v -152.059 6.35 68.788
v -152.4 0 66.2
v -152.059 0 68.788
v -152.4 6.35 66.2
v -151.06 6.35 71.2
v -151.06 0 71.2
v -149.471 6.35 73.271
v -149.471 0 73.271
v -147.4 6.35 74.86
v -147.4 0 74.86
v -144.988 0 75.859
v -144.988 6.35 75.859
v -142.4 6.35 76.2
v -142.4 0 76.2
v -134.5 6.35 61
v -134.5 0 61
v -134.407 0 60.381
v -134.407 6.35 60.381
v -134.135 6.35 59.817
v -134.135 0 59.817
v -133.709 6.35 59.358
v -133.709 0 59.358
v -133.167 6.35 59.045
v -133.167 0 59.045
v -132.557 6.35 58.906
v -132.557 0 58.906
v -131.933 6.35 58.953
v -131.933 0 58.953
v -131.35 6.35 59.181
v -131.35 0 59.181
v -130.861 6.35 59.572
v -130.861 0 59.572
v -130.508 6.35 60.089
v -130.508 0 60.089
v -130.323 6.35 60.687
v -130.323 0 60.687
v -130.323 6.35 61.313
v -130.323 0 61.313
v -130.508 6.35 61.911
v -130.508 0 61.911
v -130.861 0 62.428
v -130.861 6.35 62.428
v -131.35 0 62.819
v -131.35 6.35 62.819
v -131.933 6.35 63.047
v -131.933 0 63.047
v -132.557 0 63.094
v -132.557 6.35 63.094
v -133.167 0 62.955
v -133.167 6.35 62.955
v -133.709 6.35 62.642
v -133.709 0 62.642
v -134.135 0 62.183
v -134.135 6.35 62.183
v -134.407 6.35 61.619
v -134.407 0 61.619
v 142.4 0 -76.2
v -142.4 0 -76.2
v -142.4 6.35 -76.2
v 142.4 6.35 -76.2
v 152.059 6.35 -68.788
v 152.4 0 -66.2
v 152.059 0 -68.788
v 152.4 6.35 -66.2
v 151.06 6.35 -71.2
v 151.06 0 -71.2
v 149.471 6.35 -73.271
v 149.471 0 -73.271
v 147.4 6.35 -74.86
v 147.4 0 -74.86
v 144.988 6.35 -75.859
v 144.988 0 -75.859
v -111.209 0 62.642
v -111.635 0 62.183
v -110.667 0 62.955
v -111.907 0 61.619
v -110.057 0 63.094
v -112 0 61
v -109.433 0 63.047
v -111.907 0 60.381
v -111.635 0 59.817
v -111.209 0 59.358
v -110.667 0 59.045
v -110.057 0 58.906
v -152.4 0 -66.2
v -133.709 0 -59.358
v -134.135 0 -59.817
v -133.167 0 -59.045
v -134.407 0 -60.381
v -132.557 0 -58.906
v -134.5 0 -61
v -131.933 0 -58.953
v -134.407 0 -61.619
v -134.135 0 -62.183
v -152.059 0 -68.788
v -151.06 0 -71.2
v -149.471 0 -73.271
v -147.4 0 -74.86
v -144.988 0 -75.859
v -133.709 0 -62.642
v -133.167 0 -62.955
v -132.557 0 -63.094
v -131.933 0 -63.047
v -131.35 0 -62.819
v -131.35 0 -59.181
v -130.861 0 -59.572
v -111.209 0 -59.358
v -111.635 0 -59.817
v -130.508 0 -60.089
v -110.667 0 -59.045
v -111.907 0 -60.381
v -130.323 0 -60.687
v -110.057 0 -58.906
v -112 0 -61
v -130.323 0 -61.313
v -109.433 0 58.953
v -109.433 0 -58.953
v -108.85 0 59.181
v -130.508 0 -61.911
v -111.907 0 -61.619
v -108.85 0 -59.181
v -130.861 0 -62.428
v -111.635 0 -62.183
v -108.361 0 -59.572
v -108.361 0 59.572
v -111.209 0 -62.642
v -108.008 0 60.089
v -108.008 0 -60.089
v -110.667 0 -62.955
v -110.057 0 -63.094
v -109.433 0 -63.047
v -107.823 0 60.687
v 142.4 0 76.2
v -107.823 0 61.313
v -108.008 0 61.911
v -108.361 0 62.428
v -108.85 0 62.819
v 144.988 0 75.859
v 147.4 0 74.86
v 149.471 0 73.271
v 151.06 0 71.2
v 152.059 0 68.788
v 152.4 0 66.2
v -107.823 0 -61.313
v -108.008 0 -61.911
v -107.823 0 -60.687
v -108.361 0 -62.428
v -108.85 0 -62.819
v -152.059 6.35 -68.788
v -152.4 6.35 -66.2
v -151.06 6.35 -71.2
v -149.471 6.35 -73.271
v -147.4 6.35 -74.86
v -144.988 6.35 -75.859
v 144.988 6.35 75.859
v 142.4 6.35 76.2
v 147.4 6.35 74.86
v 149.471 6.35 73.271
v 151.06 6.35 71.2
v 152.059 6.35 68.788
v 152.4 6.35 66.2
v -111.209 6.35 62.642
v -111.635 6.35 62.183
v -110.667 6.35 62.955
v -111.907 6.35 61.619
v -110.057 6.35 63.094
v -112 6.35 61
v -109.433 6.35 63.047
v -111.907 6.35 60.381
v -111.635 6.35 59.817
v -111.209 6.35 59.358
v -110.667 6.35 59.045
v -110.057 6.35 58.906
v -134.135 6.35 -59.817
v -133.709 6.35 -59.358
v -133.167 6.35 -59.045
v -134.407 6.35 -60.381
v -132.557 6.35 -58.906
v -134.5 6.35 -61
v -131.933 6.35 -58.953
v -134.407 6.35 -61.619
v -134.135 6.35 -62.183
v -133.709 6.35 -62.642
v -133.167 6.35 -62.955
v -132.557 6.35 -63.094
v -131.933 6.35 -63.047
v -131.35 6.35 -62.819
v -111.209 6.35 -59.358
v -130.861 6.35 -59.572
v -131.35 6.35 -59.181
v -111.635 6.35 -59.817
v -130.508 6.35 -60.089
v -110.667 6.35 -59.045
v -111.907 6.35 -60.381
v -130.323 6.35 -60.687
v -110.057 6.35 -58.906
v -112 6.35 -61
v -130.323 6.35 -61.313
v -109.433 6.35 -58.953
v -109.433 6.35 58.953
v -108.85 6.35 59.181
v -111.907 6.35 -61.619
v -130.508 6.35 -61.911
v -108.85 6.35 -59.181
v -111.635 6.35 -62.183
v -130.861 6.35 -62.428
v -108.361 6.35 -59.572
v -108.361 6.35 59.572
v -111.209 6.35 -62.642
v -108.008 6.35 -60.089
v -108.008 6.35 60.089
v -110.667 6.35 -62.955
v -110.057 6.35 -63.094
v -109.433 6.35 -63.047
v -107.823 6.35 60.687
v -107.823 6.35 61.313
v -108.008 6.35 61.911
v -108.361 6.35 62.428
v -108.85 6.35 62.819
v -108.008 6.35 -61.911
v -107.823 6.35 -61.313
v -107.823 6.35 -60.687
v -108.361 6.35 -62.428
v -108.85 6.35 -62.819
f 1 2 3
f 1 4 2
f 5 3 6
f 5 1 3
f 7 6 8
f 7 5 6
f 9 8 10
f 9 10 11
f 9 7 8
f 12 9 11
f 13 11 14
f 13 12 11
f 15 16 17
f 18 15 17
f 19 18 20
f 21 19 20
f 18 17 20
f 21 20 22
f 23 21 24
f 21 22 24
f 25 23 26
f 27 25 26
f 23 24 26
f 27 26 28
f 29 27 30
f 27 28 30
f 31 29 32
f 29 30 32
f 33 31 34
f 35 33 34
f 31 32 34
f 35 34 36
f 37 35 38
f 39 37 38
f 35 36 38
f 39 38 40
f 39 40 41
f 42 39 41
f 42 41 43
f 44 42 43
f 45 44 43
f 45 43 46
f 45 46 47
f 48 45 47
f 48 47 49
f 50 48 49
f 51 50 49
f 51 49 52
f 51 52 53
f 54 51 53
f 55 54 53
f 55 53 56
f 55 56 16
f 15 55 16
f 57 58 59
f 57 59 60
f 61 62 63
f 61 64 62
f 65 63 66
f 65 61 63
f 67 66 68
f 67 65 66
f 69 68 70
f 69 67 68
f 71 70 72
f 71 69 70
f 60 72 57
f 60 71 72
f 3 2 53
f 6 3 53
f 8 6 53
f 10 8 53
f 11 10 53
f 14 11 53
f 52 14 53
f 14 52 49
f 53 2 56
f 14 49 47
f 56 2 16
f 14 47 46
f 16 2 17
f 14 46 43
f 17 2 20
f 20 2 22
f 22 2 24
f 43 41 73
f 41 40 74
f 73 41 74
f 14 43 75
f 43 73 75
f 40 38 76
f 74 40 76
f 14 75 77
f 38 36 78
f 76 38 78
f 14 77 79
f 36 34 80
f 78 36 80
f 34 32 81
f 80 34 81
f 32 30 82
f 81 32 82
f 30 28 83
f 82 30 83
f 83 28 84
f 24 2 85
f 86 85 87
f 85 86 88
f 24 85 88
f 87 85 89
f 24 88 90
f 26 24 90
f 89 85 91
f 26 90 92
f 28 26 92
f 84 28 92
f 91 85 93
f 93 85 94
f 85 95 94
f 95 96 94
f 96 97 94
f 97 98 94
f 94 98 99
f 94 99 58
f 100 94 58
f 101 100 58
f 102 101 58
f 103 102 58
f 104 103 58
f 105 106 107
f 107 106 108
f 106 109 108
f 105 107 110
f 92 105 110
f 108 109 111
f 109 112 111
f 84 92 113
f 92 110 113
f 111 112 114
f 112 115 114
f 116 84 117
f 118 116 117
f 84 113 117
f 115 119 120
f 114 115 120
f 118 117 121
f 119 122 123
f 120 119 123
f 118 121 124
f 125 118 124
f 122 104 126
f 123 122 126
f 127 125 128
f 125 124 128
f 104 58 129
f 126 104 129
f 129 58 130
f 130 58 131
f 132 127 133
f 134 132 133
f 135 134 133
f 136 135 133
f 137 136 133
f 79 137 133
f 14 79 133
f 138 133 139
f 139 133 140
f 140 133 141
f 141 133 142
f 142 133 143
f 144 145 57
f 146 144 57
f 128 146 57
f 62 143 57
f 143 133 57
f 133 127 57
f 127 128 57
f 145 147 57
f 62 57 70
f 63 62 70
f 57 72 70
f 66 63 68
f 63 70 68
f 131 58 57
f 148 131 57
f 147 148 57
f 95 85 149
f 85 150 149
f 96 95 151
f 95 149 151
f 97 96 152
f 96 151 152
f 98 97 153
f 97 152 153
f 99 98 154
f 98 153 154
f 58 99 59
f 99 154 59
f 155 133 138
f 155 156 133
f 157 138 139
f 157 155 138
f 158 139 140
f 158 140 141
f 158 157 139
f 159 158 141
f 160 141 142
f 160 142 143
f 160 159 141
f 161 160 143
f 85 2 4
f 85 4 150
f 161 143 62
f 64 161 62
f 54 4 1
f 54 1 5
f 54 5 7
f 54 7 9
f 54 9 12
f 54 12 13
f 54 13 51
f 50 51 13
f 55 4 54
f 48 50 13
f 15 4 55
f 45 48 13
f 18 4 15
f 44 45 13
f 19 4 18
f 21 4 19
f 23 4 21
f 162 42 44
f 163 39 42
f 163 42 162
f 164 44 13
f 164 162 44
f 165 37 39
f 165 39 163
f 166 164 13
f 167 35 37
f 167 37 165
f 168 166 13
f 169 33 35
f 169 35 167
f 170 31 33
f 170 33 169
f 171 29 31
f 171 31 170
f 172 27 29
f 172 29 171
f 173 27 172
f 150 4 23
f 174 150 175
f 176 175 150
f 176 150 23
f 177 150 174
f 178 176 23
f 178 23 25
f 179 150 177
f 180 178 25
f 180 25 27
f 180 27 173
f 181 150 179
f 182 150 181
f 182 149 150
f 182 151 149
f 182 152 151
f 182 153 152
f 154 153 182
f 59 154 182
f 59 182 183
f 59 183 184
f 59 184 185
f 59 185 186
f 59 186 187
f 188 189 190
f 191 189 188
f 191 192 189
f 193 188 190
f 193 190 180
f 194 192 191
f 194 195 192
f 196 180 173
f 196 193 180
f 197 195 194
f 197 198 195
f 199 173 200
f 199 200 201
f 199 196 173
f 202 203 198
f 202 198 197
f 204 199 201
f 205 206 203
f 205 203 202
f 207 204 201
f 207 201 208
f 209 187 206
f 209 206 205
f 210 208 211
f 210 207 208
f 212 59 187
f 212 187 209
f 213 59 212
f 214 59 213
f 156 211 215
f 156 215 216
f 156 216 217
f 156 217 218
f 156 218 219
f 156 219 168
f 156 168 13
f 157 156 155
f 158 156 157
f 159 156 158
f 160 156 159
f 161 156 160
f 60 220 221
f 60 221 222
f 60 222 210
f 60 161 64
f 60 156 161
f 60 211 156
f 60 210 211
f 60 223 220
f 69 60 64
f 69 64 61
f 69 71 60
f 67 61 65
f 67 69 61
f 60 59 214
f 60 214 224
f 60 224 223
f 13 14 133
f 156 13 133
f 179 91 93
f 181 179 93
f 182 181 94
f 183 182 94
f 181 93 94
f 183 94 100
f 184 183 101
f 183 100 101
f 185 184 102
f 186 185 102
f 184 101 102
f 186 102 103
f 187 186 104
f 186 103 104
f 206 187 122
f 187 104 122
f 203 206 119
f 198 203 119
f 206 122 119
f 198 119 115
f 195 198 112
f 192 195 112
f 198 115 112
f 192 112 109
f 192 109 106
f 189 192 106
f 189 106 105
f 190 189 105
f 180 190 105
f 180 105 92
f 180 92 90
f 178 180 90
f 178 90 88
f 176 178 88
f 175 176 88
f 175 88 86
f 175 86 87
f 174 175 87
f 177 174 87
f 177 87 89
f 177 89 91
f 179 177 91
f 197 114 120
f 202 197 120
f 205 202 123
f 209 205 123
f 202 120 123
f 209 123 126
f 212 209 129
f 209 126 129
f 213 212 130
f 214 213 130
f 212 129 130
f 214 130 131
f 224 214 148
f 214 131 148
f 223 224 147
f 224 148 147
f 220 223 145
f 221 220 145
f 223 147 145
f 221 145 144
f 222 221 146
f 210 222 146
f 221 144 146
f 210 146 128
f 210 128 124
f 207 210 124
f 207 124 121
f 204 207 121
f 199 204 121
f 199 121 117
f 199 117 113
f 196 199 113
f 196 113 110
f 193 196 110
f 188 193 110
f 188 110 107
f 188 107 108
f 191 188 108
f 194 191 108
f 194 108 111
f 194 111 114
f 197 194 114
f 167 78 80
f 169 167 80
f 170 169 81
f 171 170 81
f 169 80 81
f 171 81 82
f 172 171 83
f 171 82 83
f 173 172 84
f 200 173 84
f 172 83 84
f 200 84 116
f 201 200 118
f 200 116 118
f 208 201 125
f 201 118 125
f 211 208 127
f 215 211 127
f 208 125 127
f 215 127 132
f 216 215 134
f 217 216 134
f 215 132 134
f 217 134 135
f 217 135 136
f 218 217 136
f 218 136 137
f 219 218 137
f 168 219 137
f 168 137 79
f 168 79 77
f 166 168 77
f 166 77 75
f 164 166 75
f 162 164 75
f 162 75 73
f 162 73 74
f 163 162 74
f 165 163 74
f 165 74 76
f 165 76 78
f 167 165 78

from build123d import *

# Parameters (mm, degrees)
SKETCH1_W           = 304.8
SKETCH1_H           = 152.4
BOSS_EXTRUDE1_DEPTH = 6.35
FILLET1_R           = 10
M5_TAPPED_HOLE1_D   = 4.2


with BuildPart() as part:
    # Sketch1 → Boss-Extrude1 (new body)
    with BuildSketch(Plane(origin=(0, 0, 0), x_dir=(1, 0, 0), z_dir=(0, 1, 0))):
        Rectangle(SKETCH1_W, SKETCH1_H)
    extrude(amount=BOSS_EXTRUDE1_DEPTH)

    # Fillet1
    fillet1_edges = [part.edges().sort_by_distance(p)[0] for p in [
        (-152.4, 3.175, -76.2),
        (152.4, 3.175, -76.2),
        (152.4, 3.175, 76.2),
        (-152.4, 3.175, 76.2),
    ]]
    fillet(fillet1_edges, radius=FILLET1_R)

    # M5 Tapped Hole1 (through all)
    with Locations(Plane(origin=(0, 6.35, 0), x_dir=(1, 0, 0), z_dir=(0, 1, 0))):
        with Locations((-132.4, -61), (-132.4, 61), (-109.9, 61), (-109.9, -61)):
            Hole(M5_TAPPED_HOLE1_D / 2)


solid = part.part
